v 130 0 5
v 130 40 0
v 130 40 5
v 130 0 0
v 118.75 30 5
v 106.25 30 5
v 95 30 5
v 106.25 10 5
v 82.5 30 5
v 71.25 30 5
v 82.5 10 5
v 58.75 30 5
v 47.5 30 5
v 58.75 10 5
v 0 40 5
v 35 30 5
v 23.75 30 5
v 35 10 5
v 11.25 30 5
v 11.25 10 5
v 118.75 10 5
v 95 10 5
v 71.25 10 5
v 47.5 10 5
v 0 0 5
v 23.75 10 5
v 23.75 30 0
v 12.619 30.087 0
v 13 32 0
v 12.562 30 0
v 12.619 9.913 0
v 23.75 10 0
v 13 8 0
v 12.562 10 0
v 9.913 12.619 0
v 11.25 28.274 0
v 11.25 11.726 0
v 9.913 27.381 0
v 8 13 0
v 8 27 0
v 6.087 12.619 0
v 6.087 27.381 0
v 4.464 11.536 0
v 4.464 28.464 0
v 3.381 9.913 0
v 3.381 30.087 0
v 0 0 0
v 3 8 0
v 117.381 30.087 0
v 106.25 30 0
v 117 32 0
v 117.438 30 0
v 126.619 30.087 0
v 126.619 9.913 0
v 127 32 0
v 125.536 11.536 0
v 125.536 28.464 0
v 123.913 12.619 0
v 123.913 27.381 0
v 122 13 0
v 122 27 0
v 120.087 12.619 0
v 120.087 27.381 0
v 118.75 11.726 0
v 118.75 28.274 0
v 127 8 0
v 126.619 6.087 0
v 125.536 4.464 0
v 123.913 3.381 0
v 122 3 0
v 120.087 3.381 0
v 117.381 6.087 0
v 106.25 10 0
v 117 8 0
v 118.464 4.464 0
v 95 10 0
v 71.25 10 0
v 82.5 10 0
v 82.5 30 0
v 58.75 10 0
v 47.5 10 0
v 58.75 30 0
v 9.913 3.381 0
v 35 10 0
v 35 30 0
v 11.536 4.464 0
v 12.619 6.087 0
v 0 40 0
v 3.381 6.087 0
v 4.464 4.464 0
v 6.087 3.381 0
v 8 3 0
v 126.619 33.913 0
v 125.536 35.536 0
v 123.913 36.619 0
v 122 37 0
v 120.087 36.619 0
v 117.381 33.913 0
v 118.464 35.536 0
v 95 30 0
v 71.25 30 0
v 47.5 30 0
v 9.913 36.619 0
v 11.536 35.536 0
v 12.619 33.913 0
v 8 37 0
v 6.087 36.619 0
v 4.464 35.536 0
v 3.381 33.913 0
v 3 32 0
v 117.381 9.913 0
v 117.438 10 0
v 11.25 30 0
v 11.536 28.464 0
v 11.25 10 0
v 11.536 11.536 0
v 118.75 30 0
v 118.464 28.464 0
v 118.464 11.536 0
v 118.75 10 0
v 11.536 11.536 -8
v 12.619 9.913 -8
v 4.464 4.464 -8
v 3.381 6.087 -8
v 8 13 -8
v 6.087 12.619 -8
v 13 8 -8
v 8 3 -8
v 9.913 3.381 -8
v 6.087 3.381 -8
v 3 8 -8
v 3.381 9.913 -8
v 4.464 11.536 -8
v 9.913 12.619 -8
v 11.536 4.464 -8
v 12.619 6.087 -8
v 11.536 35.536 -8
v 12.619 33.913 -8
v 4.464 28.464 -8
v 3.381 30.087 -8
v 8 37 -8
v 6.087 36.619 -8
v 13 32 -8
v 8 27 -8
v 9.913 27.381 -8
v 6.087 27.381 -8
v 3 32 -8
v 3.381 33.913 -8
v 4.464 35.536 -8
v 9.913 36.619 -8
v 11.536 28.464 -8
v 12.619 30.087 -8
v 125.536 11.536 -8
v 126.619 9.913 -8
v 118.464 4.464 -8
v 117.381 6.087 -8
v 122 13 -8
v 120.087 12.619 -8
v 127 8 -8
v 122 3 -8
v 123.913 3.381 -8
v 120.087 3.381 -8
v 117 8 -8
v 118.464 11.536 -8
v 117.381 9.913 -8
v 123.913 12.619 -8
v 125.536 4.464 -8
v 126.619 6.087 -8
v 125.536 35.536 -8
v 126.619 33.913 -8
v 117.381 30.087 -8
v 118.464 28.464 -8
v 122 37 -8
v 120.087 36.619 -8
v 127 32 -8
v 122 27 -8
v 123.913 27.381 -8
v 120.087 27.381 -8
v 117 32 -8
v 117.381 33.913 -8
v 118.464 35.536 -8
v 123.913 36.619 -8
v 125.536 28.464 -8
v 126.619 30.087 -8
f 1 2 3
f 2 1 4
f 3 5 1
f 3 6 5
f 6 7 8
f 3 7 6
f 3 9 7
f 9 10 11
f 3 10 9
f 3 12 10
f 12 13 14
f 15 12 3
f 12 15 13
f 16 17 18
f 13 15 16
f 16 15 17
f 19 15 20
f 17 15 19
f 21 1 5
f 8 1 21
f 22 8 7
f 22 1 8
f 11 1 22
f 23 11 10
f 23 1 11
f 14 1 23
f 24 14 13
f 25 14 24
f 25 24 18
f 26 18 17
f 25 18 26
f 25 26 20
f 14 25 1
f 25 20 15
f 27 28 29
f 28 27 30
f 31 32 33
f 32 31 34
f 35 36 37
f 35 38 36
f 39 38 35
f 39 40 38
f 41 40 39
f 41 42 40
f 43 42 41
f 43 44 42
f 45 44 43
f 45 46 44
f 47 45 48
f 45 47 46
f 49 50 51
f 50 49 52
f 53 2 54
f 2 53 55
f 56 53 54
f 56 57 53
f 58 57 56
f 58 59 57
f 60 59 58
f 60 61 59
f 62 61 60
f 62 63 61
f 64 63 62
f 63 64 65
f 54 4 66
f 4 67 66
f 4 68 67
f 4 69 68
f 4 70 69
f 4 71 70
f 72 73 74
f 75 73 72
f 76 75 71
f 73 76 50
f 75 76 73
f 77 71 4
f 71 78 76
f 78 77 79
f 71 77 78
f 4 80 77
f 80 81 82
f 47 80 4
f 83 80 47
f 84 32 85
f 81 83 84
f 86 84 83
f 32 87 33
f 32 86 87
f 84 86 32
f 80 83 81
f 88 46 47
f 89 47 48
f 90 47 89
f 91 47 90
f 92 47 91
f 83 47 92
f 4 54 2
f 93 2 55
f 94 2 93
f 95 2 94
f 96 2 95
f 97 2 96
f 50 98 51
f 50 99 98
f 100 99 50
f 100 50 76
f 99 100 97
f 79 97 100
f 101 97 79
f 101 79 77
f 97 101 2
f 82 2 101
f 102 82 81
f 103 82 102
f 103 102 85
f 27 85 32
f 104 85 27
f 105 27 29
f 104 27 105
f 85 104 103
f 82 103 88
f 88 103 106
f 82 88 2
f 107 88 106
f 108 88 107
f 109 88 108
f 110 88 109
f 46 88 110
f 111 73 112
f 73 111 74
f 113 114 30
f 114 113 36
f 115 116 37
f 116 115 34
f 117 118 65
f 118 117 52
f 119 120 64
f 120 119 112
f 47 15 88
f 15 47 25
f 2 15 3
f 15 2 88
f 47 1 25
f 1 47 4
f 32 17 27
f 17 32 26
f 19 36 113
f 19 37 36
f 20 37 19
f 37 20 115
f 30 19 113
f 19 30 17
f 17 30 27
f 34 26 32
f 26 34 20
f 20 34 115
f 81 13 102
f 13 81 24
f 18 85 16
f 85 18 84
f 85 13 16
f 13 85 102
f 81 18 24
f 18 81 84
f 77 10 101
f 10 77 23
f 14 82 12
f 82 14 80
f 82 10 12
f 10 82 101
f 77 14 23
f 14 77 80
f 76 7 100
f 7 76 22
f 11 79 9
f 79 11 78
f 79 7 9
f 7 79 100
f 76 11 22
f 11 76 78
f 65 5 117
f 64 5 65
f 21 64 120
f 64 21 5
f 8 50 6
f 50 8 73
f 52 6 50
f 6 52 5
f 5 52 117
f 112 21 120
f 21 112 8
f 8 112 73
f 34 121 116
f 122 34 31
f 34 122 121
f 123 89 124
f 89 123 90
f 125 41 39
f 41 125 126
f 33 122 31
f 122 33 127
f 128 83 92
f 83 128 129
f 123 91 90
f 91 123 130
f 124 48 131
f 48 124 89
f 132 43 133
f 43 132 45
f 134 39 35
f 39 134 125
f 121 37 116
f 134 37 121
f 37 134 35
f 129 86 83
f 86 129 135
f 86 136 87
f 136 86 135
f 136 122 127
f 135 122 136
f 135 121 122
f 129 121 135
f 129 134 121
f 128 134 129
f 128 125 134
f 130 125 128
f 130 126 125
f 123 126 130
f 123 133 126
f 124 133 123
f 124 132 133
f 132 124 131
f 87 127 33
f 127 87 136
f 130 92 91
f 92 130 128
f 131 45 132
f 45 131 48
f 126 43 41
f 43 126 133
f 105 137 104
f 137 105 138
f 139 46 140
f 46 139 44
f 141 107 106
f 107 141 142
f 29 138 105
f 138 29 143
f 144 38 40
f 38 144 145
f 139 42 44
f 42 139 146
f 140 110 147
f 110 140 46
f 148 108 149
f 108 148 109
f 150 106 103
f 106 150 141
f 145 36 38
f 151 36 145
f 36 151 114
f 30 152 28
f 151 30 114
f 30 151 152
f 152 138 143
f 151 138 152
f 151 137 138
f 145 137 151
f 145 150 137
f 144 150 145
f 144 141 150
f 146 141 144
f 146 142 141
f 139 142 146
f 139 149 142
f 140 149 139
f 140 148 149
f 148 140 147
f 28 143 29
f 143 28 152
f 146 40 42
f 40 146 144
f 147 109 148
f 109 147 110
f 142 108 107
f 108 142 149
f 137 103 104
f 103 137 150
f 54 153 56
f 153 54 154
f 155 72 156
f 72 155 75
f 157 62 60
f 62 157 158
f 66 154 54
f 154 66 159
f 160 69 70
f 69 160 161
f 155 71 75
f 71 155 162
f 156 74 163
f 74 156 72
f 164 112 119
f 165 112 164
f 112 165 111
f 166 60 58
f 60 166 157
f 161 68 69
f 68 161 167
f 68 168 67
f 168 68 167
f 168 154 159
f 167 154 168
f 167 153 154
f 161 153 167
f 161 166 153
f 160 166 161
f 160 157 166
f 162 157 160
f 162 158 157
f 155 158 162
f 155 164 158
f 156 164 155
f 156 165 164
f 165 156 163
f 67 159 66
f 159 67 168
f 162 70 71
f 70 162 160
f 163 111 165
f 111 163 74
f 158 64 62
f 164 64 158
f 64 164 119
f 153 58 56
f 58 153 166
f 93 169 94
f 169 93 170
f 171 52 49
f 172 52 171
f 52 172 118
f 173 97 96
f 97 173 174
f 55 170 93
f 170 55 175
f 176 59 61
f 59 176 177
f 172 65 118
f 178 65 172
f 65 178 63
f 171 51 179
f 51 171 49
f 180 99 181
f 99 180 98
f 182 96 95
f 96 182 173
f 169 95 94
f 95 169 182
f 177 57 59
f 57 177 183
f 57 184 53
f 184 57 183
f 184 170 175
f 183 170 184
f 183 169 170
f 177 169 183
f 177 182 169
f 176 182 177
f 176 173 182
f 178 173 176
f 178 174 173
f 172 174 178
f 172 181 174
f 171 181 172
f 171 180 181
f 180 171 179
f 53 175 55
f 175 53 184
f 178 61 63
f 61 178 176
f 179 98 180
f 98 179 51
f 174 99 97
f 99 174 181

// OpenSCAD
// =========================
// Base plate parameters
// =========================
base_w = 130;
base_h = 40;
base_d = 5;

// rocker switch
rock_w = 12.5;
rock_h = 20;
rock_d = base_d + 0.2;  // to cut below and above plate
rock_count = 5;

// spacing
free_space = base_w - rock_count * rock_w;
spacing = free_space / (rock_count + 1);

// rocker switch position increments
x = spacing + rock_w;
y = (base_h - rock_h) / 2;


// =========================
// Foot parameters (simple cylinders)
// =========================
foot_h = 8;
foot_r = 5;
foot_m = 8;


// =========================
// Model
// =========================
difference() {

    // Base plate
    cube([base_w, base_h, base_d]);

    // Rocker switch cutouts — no loops
    translate([x *0 + spacing, y, -0.1])        cube([rock_w, rock_h, rock_d]);
    translate([x *1 + spacing, y, -0.1])        cube([rock_w, rock_h, rock_d]);
    translate([x *2 + spacing, y, -0.1])        cube([rock_w, rock_h, rock_d]);
    translate([x *3 + spacing, y, -0.1])        cube([rock_w, rock_h, rock_d]);
    translate([x *4 + spacing, y, -0.1])        cube([rock_w, rock_h, rock_d]);
}


// =========================
// Feet (simple cylinders)
// =========================

// Move all feet below the plate
translate([0, 0, -foot_h]) {

    // Front & Rear left foot
    translate([foot_m, foot_m,          0]) linear_extrude(foot_h) circle(foot_r);
    translate([foot_m, base_h - foot_m, 0]) linear_extrude(foot_h) circle(foot_r);

    // Front & Rear right foot
    translate([base_w - foot_m, foot_m,          0]) linear_extrude(foot_h) circle(foot_r);
    translate([base_w - foot_m, base_h - foot_m, 0]) linear_extrude(foot_h) circle(foot_r);
}
